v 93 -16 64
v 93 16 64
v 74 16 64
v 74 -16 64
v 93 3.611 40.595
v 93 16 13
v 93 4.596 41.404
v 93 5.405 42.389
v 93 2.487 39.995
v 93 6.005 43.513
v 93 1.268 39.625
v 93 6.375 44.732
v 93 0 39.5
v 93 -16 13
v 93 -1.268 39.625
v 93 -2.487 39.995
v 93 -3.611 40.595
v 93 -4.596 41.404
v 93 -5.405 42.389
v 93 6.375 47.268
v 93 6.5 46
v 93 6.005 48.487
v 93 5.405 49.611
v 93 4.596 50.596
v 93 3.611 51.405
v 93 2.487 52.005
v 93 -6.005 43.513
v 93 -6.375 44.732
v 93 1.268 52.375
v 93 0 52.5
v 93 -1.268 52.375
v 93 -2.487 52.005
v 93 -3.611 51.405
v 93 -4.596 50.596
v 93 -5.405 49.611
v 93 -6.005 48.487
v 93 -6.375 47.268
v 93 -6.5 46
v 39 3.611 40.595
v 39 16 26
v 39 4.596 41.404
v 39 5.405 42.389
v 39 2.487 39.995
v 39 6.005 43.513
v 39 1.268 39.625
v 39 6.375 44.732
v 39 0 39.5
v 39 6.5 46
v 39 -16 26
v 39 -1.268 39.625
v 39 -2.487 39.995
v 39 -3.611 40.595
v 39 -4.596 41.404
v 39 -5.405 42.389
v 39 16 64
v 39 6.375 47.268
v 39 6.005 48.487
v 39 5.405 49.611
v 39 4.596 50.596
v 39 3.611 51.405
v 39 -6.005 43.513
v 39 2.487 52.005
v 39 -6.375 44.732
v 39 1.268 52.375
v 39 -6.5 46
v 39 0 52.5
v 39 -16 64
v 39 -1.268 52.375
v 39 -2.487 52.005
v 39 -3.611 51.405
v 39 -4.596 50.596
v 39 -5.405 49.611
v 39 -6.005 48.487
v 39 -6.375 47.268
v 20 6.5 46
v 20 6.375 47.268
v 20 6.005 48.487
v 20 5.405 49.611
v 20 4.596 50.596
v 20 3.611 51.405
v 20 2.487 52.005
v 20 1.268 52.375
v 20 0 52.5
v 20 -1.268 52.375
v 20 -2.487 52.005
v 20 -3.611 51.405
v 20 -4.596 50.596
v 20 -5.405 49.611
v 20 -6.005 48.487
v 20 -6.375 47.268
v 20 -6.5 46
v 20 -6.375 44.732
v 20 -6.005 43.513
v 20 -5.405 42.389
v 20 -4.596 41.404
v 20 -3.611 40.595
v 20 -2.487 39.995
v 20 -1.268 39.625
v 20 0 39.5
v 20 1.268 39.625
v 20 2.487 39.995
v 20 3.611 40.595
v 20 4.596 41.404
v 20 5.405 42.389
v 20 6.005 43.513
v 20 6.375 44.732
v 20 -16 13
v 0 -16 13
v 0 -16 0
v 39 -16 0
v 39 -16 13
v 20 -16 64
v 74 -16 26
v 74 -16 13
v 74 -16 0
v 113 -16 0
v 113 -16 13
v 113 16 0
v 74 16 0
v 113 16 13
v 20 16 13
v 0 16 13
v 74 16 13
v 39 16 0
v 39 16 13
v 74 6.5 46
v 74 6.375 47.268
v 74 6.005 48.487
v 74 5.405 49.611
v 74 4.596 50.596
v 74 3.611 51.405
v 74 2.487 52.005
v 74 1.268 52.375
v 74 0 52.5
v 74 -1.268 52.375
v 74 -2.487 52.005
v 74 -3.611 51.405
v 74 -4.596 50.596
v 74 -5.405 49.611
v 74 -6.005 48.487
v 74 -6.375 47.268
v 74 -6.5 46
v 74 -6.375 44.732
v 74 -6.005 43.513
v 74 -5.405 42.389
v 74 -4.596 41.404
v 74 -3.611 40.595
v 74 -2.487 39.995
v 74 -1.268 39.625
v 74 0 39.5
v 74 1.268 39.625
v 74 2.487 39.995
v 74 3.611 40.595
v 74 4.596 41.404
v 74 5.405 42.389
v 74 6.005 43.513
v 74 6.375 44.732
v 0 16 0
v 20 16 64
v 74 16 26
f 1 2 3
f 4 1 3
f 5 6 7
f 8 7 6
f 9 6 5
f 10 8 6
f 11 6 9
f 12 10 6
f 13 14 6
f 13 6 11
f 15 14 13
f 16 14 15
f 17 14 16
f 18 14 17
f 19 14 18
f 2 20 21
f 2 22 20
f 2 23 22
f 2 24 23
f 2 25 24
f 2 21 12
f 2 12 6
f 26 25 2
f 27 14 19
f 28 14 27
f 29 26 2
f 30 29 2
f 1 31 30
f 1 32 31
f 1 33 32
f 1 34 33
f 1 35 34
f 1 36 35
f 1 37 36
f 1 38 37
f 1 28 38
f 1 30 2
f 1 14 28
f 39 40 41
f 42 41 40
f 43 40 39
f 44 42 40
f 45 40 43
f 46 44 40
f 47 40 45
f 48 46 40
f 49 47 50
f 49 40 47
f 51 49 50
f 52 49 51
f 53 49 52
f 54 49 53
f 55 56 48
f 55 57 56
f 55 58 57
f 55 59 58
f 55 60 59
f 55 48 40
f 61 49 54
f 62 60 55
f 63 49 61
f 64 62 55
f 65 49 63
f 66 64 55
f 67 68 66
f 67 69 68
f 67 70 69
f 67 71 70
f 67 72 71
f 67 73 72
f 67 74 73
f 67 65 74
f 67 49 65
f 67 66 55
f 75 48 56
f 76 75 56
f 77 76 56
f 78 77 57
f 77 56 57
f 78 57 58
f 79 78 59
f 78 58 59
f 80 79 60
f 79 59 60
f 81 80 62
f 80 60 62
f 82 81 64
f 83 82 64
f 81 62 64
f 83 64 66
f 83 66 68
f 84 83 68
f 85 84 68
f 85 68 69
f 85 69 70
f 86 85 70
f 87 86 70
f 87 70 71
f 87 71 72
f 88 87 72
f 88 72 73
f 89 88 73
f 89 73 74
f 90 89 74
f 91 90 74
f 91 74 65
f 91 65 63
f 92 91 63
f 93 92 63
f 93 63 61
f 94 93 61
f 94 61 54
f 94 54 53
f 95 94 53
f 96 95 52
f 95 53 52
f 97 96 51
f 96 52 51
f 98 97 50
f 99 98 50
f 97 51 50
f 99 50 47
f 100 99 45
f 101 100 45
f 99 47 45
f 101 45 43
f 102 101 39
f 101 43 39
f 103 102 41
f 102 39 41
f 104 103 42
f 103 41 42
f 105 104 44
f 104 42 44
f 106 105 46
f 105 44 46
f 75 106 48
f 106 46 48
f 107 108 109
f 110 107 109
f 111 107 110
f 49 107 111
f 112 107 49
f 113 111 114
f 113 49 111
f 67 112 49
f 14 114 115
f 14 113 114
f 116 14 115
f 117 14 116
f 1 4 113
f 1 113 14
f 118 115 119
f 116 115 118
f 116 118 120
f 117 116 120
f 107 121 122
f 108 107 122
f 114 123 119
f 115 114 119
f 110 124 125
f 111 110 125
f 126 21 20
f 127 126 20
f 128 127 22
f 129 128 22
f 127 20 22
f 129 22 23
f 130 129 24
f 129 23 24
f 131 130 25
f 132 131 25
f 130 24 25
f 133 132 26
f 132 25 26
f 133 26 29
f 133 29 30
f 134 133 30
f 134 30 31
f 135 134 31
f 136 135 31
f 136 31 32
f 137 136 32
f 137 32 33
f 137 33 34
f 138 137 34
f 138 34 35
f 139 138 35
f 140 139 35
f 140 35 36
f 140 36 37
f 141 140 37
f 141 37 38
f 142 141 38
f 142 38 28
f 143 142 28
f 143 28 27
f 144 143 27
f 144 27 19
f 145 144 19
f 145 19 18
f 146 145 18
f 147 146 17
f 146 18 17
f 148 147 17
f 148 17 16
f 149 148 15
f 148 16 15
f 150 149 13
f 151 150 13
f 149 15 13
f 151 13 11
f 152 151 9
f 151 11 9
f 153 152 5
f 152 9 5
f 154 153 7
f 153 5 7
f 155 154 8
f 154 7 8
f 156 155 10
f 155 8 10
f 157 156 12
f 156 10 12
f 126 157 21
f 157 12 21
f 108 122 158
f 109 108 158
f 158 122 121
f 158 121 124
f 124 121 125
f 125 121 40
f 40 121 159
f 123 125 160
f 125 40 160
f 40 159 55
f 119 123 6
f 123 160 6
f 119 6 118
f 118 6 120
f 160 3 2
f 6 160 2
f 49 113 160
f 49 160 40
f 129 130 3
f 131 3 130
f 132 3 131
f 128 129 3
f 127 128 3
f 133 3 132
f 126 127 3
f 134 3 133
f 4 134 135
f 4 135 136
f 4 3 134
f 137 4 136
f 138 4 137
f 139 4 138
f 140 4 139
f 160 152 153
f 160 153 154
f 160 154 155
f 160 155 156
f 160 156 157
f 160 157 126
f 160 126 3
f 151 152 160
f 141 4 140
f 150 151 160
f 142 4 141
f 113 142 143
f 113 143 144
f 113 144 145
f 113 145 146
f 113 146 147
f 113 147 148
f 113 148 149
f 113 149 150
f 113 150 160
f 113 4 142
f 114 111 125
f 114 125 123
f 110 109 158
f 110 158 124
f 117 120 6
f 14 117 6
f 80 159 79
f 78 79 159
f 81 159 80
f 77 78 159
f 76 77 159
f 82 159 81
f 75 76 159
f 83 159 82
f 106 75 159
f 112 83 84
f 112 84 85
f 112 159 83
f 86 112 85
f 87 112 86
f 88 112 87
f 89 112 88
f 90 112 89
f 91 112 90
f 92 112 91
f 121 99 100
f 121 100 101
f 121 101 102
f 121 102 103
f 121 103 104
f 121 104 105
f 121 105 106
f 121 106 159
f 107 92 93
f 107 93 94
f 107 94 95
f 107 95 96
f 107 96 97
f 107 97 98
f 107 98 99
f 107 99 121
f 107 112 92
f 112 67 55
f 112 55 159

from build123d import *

# Parameters (mm, degrees)
F1_DEPTH = 16
F2_R     = 6.5
F3_DEPTH = 93.001
F4_DEPTH = 93.001


with BuildPart() as f1:
    # F0 (on Front) → F1 (new body, symmetric)
    with BuildSketch(Plane.XZ):
        Polygon((0, 13), (0, 0), (39, 0), (39, 13), (74, 13), (74, 0), (113, 0), (113, 13), (93, 13), (93, 64), (74, 64), (74, 26), (39, 26), (39, 64), (20, 64), (20, 13), align=None)
    extrude(amount=F1_DEPTH, both=True)

    # F2 (on face) → F3 (cut, through all)
    with BuildSketch(Plane.YZ.offset(93)):
        with Locations((0, 46)):
            Circle(F2_R)
    extrude(amount=-F3_DEPTH, mode=Mode.SUBTRACT)

    # F2 (on face) → F4 (cut, through all)
    with BuildSketch(Plane.YZ.offset(93)):
        with Locations((0, 46)):
            Circle(F2_R)
    extrude(amount=-F4_DEPTH, mode=Mode.SUBTRACT)


solid = f1.part
